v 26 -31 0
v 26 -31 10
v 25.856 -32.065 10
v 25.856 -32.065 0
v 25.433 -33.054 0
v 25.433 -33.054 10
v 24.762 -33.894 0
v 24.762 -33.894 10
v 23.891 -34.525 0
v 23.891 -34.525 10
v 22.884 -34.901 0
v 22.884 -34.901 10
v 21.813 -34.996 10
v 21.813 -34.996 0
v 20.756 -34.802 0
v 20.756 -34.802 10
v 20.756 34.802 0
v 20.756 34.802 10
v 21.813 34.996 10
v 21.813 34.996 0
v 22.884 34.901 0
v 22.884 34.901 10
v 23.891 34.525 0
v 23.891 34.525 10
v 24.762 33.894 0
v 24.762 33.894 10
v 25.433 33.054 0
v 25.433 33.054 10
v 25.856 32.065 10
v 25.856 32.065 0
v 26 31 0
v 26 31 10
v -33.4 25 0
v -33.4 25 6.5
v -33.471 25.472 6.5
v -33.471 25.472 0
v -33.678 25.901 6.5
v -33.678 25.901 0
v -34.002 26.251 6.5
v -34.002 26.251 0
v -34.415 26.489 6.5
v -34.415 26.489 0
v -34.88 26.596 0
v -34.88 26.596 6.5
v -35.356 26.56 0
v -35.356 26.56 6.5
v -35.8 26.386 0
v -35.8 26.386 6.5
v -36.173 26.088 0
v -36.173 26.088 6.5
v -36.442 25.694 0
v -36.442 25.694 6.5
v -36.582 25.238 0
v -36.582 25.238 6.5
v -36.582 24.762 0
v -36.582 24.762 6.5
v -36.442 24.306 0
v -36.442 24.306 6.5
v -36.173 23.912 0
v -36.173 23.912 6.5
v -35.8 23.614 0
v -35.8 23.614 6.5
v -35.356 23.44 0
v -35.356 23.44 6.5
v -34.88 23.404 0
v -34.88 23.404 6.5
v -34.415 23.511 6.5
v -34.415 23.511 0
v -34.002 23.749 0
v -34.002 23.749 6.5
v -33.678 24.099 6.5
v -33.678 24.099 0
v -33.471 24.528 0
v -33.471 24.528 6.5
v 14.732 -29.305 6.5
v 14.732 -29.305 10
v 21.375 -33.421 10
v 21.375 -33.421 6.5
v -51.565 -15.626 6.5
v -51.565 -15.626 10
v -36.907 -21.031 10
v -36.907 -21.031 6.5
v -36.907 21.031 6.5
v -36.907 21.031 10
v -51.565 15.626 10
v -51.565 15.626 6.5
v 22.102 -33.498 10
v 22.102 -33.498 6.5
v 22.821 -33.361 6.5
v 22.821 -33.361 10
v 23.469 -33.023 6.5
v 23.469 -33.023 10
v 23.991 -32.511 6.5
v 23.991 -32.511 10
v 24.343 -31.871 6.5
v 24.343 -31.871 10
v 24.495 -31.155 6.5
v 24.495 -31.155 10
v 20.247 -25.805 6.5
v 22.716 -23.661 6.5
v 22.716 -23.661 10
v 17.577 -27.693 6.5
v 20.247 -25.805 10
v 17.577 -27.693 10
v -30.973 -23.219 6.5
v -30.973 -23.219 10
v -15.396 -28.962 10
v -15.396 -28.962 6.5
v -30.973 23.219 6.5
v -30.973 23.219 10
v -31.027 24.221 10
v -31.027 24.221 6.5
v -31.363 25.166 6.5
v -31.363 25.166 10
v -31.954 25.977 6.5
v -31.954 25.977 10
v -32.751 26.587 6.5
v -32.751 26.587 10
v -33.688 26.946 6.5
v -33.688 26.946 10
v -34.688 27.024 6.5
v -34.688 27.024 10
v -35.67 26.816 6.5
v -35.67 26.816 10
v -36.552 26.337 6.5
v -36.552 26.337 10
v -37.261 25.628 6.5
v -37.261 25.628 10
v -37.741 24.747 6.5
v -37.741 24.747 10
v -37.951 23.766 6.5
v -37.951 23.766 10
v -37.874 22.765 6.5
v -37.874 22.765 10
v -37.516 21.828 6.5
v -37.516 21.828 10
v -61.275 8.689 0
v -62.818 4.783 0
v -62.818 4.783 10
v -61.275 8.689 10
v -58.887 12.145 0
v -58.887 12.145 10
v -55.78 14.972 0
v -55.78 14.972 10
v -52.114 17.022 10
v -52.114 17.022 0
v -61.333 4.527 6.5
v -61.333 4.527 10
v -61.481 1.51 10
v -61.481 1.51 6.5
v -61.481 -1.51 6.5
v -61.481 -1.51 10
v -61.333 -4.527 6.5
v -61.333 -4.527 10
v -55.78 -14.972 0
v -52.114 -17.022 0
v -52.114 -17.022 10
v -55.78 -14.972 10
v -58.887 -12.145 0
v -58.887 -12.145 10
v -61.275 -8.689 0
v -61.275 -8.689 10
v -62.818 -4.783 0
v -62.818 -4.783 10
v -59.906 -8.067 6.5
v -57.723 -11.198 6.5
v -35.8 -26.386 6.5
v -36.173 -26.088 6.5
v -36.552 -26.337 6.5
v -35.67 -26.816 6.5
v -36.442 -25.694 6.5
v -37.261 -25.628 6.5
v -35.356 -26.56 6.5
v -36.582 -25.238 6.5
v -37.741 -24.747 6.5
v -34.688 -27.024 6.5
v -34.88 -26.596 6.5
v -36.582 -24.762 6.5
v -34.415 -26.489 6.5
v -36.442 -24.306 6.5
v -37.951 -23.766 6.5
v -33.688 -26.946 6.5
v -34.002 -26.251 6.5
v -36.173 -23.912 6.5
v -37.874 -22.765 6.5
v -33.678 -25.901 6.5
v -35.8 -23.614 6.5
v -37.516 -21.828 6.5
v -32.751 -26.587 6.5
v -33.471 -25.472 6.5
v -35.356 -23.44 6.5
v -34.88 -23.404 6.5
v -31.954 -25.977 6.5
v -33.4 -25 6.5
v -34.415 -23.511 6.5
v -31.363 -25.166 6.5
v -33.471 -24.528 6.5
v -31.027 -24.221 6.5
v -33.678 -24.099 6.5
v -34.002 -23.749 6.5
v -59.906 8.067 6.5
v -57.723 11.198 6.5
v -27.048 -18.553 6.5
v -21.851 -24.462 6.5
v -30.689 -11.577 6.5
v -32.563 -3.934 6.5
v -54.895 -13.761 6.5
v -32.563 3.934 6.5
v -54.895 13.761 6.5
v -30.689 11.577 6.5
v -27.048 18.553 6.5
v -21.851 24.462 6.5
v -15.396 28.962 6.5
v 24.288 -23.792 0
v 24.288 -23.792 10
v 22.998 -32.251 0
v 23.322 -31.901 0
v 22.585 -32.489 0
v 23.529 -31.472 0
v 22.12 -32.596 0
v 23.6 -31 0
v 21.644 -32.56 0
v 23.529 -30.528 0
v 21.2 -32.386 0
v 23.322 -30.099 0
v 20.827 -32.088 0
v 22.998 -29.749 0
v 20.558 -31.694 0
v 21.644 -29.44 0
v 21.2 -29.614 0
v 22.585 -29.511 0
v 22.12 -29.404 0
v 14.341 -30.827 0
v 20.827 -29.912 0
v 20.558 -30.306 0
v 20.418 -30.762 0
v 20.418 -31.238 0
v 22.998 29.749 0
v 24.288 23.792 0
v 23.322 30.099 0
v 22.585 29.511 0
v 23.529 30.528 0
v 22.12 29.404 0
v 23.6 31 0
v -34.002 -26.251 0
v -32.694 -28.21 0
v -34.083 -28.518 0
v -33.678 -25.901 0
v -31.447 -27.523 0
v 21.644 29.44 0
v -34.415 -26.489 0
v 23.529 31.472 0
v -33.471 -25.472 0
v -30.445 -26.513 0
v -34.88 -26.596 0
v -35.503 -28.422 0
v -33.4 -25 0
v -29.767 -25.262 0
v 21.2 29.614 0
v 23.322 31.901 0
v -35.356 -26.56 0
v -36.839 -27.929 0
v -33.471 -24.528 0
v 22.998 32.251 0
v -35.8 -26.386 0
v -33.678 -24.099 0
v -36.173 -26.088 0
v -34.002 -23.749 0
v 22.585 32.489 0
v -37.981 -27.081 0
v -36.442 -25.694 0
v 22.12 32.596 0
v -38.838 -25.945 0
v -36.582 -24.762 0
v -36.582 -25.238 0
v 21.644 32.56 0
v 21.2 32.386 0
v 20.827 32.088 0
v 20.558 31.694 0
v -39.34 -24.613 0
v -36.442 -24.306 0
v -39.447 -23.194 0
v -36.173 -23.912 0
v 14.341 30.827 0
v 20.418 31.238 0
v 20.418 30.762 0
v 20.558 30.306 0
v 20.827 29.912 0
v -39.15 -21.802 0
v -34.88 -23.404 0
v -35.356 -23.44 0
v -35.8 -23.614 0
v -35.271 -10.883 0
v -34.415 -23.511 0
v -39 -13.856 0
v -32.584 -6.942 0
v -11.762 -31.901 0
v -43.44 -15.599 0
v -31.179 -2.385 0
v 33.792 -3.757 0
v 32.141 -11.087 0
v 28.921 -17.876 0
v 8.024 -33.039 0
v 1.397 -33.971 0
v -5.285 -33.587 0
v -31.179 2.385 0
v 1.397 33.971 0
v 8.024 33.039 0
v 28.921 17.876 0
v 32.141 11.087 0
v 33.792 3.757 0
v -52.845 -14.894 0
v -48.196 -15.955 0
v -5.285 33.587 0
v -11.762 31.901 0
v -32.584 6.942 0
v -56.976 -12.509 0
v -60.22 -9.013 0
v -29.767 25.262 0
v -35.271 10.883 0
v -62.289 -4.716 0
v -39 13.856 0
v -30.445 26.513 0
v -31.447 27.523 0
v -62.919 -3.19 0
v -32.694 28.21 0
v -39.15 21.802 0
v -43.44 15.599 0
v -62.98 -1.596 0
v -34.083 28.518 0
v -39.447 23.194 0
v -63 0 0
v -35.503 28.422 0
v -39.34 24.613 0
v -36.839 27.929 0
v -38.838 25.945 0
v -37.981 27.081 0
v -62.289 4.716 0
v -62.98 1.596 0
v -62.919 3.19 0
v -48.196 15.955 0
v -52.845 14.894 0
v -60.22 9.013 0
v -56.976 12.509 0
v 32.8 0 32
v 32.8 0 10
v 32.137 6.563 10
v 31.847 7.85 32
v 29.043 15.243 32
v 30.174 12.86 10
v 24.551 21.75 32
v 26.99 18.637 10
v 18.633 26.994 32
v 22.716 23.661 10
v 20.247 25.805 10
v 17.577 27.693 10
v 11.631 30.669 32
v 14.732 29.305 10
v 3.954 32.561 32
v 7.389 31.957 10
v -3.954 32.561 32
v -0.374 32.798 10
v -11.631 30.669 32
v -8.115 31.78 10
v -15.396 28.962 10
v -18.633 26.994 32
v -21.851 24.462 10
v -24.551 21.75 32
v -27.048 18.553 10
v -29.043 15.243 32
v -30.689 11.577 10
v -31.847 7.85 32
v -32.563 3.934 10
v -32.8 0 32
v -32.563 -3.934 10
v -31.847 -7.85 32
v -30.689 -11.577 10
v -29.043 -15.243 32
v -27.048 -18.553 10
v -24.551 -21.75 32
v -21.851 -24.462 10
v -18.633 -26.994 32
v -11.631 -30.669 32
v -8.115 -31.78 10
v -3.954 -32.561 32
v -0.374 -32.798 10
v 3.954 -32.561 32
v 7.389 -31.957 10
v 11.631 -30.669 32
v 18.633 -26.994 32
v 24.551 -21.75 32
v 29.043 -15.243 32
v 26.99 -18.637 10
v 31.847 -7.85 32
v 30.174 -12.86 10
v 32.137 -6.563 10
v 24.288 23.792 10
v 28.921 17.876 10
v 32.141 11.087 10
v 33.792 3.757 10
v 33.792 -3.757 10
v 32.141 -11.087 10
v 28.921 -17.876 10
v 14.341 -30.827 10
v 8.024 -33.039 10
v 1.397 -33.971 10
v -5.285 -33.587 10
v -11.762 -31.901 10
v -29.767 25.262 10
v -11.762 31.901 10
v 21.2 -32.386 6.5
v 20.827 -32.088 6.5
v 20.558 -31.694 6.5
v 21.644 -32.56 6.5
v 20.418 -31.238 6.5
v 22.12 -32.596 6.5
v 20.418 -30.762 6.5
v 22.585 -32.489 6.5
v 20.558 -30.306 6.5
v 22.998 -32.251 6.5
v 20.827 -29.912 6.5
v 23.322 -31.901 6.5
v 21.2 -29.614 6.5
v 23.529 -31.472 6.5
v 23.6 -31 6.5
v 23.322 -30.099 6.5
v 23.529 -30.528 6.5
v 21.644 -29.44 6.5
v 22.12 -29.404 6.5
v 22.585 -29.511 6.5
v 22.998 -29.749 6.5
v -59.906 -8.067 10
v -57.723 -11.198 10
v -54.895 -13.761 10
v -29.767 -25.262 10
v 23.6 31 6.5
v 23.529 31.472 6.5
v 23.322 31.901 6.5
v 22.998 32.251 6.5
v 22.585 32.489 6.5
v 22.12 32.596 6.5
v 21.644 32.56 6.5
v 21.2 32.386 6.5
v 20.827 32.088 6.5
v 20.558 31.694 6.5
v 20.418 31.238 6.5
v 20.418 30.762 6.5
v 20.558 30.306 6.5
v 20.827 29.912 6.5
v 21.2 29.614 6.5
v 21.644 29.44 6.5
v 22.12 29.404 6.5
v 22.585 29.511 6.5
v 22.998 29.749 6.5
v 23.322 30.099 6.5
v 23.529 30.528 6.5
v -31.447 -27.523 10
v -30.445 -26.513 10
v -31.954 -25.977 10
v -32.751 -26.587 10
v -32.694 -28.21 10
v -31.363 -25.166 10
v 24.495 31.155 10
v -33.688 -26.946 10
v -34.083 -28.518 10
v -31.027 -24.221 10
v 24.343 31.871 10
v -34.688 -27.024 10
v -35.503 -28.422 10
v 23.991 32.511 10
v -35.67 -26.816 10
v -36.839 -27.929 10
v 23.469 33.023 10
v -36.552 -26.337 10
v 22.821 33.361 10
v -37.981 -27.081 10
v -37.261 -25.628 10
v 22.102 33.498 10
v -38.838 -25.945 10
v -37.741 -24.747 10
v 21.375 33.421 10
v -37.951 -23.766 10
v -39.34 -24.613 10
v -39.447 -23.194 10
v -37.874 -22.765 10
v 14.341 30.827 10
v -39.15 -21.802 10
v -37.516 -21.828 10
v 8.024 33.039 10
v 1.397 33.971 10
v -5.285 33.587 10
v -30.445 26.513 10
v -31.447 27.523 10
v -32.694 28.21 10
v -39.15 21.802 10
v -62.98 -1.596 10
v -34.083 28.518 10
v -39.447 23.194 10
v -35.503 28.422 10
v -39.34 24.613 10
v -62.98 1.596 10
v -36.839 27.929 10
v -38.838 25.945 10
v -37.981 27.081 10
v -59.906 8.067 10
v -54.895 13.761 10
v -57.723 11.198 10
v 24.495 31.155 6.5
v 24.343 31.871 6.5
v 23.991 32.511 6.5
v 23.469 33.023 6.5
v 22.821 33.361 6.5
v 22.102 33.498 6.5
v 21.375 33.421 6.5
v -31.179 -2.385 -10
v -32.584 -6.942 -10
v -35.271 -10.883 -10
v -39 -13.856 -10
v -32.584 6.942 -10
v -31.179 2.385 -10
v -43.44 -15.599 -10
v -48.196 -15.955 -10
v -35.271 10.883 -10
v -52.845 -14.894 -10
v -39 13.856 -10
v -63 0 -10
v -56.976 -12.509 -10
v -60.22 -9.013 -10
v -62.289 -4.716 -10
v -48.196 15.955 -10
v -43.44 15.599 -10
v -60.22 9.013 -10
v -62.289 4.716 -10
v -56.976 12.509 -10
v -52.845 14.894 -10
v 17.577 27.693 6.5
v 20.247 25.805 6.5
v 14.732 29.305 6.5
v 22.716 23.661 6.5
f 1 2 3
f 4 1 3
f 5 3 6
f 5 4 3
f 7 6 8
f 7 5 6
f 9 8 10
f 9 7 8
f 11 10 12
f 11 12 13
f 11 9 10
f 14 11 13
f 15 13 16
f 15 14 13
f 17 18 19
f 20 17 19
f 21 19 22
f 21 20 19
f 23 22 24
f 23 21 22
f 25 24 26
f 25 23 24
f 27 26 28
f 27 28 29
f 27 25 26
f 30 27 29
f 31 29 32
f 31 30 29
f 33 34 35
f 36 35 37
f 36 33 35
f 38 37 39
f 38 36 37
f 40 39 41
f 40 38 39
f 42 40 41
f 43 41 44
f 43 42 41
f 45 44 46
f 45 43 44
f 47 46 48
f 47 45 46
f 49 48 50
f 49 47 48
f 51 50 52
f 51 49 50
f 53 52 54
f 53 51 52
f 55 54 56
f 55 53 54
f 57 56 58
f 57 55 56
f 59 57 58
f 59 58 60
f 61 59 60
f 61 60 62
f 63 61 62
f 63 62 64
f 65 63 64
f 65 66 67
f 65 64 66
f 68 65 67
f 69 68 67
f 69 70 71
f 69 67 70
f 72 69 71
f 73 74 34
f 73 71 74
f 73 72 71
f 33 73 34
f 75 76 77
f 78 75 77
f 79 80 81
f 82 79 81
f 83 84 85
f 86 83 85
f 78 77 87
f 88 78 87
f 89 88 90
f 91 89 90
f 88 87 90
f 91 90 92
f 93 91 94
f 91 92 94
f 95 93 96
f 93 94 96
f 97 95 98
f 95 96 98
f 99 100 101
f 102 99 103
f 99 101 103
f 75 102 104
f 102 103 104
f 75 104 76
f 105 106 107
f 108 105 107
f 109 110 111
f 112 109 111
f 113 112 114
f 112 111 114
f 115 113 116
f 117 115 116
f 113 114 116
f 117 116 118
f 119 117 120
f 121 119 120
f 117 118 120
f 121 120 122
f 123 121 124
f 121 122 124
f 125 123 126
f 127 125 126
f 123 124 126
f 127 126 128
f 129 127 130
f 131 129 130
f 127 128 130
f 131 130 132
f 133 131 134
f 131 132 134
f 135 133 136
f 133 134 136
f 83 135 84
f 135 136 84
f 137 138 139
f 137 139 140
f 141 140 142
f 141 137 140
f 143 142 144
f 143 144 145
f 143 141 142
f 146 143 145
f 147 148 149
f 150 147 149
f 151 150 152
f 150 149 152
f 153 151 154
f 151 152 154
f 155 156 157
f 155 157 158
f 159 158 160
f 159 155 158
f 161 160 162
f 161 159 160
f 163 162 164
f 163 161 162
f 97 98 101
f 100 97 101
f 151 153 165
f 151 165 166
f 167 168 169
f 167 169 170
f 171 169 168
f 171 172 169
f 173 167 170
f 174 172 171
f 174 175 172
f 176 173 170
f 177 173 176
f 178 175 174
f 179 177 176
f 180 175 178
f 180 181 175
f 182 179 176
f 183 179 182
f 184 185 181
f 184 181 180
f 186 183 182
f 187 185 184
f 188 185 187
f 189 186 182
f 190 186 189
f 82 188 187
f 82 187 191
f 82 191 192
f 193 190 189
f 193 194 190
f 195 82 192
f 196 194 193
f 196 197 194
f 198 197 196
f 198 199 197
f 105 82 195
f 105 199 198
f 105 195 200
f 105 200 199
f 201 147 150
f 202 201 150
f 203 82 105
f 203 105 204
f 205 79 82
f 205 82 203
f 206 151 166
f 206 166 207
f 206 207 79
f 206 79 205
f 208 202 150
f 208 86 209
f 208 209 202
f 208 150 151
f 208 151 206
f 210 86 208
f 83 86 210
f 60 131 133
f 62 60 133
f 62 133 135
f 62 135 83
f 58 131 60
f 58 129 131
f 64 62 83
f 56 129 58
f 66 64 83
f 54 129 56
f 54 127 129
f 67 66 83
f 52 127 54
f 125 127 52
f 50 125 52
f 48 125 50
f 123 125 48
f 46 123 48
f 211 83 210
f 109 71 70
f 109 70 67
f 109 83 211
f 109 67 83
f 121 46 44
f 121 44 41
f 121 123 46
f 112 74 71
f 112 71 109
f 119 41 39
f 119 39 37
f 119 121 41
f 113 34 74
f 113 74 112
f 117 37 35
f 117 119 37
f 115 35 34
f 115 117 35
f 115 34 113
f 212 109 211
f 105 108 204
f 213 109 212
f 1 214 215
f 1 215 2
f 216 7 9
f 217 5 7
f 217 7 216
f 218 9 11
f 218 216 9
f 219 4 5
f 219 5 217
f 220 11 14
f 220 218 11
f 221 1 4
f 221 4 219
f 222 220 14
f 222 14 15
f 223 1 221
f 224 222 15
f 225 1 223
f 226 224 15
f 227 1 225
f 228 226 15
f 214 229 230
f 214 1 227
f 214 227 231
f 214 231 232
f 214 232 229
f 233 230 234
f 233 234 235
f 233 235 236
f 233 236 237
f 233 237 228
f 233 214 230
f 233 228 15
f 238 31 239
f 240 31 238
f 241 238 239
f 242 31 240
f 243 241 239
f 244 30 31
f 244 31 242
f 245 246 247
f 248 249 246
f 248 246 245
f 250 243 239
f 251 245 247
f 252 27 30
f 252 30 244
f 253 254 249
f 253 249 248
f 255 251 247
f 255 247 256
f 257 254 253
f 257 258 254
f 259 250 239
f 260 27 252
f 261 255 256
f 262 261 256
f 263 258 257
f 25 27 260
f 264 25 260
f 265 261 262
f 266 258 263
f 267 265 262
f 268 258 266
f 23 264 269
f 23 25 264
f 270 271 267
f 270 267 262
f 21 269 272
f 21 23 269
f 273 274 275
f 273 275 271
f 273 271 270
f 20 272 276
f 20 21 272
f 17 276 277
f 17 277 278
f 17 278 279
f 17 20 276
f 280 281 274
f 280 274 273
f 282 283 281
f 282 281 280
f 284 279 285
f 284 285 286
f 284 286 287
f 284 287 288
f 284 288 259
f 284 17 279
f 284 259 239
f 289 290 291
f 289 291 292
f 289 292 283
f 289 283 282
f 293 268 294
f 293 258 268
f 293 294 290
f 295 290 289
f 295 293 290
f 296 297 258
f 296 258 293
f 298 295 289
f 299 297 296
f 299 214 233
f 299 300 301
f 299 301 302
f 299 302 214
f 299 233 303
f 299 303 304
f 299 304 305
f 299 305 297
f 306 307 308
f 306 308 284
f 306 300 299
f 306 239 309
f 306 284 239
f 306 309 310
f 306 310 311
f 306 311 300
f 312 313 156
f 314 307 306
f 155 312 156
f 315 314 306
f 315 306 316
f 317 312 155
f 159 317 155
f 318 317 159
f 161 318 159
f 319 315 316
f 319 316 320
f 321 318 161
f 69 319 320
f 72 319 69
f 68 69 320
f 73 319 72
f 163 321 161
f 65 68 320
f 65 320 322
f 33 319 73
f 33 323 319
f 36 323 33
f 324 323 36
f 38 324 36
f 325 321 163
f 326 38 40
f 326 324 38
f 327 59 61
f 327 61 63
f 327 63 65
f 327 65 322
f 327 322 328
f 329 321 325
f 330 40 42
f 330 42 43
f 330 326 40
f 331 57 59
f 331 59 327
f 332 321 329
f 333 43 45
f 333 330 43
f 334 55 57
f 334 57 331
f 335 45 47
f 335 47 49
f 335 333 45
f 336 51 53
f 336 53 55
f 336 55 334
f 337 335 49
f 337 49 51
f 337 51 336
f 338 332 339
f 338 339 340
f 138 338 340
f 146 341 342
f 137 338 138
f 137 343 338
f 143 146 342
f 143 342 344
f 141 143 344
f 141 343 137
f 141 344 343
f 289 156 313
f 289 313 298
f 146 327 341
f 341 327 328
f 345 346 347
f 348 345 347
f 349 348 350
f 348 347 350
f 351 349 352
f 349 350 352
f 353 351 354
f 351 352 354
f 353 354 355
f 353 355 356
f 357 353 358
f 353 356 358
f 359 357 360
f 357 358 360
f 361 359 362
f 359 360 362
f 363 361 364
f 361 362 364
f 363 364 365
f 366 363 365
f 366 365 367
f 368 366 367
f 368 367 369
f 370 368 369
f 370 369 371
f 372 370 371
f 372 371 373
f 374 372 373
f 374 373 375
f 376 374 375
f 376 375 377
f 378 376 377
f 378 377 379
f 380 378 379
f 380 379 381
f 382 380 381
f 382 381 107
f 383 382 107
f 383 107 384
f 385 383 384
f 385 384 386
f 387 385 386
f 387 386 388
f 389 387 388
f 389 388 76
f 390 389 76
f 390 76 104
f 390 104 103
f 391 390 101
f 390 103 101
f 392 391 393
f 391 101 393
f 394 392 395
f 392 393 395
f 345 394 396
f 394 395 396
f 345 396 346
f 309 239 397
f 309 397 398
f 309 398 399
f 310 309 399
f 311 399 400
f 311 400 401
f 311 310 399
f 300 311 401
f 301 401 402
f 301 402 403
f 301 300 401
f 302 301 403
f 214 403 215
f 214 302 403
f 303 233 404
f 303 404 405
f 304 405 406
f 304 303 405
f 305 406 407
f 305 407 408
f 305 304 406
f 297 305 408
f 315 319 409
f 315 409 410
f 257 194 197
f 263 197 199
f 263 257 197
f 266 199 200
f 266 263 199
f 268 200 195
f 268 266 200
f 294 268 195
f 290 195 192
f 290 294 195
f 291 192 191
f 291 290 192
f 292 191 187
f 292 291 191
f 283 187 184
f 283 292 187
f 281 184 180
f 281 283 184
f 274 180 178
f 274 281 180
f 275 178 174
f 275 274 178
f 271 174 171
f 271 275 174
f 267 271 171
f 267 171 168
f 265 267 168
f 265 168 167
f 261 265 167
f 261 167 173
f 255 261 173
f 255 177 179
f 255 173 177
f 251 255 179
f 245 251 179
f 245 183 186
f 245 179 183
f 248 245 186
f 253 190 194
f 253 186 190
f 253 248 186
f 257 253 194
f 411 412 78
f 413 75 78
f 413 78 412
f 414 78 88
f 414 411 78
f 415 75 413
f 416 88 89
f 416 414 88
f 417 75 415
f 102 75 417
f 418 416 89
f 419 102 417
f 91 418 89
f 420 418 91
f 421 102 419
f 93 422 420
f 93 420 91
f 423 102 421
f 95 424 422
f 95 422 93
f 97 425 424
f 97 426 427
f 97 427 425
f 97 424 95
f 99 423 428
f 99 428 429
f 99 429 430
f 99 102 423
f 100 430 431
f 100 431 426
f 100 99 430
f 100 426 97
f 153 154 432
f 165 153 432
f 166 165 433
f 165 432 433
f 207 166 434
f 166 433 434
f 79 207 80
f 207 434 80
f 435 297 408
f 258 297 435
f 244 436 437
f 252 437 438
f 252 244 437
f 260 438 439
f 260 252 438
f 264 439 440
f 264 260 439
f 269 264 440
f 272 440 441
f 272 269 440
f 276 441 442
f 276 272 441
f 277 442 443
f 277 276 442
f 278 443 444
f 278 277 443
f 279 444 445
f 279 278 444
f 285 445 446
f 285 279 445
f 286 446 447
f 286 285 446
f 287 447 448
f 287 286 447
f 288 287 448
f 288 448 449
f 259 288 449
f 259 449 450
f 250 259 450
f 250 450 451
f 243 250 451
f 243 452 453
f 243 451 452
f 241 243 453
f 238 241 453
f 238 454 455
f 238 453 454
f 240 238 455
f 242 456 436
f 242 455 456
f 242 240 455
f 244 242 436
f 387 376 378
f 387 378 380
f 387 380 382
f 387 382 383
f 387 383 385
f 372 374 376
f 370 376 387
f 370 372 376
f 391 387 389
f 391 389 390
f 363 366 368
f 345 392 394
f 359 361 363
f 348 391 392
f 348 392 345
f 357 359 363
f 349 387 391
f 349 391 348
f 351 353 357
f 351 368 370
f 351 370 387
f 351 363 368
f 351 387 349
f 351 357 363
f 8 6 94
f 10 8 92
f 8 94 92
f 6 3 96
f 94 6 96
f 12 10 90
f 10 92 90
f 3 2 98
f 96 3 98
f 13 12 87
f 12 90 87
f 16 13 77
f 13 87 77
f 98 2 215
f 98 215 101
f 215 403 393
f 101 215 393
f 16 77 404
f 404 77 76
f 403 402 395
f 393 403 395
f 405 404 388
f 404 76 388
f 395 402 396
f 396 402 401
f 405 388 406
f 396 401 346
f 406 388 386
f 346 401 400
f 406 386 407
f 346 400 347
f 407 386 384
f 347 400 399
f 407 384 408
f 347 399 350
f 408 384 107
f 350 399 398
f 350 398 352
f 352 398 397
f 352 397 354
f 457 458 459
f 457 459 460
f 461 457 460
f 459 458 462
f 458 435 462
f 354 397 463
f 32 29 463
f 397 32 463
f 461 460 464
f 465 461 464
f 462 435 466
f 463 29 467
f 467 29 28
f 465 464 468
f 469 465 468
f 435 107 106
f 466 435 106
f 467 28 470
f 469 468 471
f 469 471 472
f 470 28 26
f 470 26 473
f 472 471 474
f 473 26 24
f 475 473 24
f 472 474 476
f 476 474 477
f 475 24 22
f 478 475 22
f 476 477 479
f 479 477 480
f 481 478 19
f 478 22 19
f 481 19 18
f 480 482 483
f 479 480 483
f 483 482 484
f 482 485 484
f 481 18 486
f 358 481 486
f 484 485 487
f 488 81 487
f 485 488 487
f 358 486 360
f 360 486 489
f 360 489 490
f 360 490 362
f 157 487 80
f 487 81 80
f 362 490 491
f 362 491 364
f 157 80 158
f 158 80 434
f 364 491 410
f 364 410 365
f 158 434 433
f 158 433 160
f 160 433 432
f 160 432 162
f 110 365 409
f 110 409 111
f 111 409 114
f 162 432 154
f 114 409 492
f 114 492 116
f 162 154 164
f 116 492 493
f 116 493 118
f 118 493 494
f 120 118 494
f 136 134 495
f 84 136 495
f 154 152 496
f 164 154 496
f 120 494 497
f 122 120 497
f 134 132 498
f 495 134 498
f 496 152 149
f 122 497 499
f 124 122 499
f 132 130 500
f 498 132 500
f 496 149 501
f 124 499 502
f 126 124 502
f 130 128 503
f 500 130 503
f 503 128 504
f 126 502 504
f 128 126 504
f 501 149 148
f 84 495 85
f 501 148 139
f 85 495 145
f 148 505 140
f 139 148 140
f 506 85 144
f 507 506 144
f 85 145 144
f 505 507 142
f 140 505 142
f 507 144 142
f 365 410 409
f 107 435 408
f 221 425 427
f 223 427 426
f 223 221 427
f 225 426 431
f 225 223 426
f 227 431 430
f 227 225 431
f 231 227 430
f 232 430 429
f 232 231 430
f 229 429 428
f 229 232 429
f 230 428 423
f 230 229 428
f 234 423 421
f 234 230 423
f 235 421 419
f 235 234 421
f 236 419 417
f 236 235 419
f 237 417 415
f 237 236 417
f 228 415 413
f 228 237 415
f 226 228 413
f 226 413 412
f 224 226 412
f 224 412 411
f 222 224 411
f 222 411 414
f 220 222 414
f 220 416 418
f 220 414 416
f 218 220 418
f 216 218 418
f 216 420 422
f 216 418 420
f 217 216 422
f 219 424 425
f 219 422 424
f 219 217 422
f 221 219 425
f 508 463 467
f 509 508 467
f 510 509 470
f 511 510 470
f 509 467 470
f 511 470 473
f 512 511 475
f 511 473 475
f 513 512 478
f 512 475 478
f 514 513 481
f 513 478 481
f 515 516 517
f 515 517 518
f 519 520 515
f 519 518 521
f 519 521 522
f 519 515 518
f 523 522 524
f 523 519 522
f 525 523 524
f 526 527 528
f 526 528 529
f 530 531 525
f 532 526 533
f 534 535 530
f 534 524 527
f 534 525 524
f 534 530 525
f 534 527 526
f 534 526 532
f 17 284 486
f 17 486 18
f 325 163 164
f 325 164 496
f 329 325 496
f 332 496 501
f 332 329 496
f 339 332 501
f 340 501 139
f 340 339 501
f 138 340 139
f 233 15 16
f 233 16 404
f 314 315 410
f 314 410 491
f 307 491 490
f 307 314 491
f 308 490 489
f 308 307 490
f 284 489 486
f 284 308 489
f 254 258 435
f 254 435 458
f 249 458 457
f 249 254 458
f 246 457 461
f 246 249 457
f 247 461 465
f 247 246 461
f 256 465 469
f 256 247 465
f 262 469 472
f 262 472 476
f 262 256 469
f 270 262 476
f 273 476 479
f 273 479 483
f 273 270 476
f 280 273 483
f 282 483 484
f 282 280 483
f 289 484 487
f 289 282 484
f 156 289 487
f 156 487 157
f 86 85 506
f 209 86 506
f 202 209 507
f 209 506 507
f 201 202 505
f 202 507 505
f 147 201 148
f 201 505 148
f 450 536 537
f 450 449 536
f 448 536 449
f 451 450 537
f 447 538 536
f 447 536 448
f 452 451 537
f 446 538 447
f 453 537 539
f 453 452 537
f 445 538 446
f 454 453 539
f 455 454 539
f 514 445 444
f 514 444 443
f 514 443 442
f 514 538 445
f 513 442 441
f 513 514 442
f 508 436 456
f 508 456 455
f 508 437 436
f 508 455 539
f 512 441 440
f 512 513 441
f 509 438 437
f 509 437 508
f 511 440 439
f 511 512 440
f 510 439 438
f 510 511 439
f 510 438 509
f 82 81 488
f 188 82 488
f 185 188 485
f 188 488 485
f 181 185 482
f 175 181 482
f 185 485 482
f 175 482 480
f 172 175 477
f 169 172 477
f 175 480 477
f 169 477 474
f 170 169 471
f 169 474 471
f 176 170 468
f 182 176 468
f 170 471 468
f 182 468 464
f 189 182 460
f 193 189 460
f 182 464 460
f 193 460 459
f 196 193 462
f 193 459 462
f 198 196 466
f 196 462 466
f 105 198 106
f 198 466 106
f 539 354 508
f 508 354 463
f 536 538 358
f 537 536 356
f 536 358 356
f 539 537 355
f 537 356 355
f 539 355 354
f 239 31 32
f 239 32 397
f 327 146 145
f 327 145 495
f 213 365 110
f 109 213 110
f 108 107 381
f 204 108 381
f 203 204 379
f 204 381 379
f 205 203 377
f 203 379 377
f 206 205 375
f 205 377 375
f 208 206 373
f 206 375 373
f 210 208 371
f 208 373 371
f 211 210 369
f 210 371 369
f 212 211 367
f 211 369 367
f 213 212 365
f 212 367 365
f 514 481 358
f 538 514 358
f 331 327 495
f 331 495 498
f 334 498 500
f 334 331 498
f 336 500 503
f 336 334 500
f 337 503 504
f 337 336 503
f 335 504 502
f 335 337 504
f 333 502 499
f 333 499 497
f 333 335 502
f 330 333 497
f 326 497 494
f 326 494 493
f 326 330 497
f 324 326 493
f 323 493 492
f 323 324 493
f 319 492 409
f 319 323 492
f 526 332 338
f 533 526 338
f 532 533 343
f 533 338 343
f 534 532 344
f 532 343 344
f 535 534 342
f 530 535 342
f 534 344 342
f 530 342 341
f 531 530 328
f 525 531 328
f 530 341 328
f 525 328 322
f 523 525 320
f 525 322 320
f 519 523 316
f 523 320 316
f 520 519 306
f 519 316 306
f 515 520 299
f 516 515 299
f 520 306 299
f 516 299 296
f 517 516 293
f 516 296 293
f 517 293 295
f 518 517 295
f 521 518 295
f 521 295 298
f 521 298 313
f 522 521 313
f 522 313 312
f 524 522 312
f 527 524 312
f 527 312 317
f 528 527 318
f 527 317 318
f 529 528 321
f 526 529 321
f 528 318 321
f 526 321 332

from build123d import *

# Parameters (mm, degrees)
ESQUISSE1_R             = 1.6
BOSS_EXTRU_1_DEPTH      = 10
ESQUISSE2_R             = 32.8
BOSS_EXTRU_2_DEPTH      = 22
ENL_V_MAT_EXTRU_1_DEPTH = 3.5
BOSS_EXTRU_3_REACH      = 12
ESQUISSE5_R             = 16
BOSS_EXTRU_4_DEPTH      = 10


with BuildPart() as part:
    # Esquisse1 → Boss.-Extru.1 (new body)
    with BuildSketch(Plane.XY):
        with BuildLine():
            ThreePointArc((-52.114163482, -17.022112424), (-58.887228209, -12.14530881), (-62.818181851, -4.782889184))
            ThreePointArc((-62.818181851, -4.782889184), (-63, 0), (-62.818181851, 4.782889184))
            ThreePointArc((-62.818181851, 4.782889184), (-58.887228209, 12.14530881), (-52.114163482, 17.022112424))
            Line((-52.114163482, 17.022112424), (-39.149984877, 21.802247897))
            ThreePointArc((-39.149984877, 21.802247897), (-36.188478781, 28.223266636), (-29.767460042, 25.26176054))
            Line((-29.767460042, 25.26176054), (-11.762342986, 31.900584438))
            ThreePointArc((-11.762342986, 31.900584438), (1.39665257, 33.97130203), (14.341260705, 30.827394333))
            Line((14.341260705, 30.827394333), (20.756023105, 34.801647207))
            ThreePointArc((20.756023105, 34.801647207), (24.347774736, 34.238511045), (26, 31))
            Line((26, 31), (24.288429708, 23.792271483))
            ThreePointArc((24.288429708, 23.792271483), (34, 0), (24.288429708, -23.792271483))
            Line((24.288429708, -23.792271483), (26, -31))
            ThreePointArc((26, -31), (24.347774736, -34.238511045), (20.756023105, -34.801647207))
            Line((20.756023105, -34.801647207), (14.341260705, -30.827394333))
            ThreePointArc((14.341260705, -30.827394333), (1.39665257, -33.97130203), (-11.762342986, -31.900584438))
            Line((-11.762342986, -31.900584438), (-29.767460042, -25.26176054))
            ThreePointArc((-29.767460042, -25.26176054), (-36.188478781, -28.223266636), (-39.149984877, -21.802247897))
            Line((-39.149984877, -21.802247897), (-52.114163482, -17.022112424))
        make_face()
        with Locations((-35, -25)):
            Circle(ESQUISSE1_R, mode=Mode.SUBTRACT)
        with Locations((22, 31)):
            Circle(ESQUISSE1_R, mode=Mode.SUBTRACT)
        with Locations((-35, 25)):
            Circle(ESQUISSE1_R, mode=Mode.SUBTRACT)
        with Locations((22, -31)):
            Circle(ESQUISSE1_R, mode=Mode.SUBTRACT)
    extrude(amount=BOSS_EXTRU_1_DEPTH)

    # Esquisse2 → Boss.-Extru.2 (add)
    with BuildSketch(Plane.XY.offset(10)):
        Circle(ESQUISSE2_R)
    extrude(amount=BOSS_EXTRU_2_DEPTH)

    # Esquisse3 → Enlèv. mat.-Extru.1 (cut)
    with BuildSketch(Plane.XY.offset(10)):
        with BuildLine():
            Line((-51.564604514, -15.626028317), (-36.906810431, -21.030631539))
            ThreePointArc((-36.906810431, -21.030631539), (-35.669551885, -26.815887911), (-30.972780695, -23.218619448))
            Line((-30.972780695, -23.218619448), (-11.24341609, -30.493205713))
            ThreePointArc((-11.24341609, -30.493205713), (1.736287169, -32.453586965), (14.43273391, -29.119515653))
            Line((14.43273391, -29.119515653), (21.375089208, -33.420637623))
            ThreePointArc((21.375089208, -33.420637623), (23.468804453, -33.02302088), (24.495170617, -31.155317718))
            Line((24.495170617, -31.155317718), (22.63500045, -23.321808563))
            ThreePointArc((22.63500045, -23.321808563), (32.5, 0), (22.63500045, 23.321808563))
            Line((22.63500045, 23.321808563), (24.495170617, 31.155317718))
            ThreePointArc((24.495170617, 31.155317718), (23.468804453, 33.02302088), (21.375089208, 33.420637623))
            Line((21.375089208, 33.420637623), (14.43273391, 29.119515653))
            ThreePointArc((14.43273391, 29.119515653), (1.736287169, 32.453586965), (-11.24341609, 30.493205713))
            Line((-11.24341609, 30.493205713), (-30.972780695, 23.218619448))
            ThreePointArc((-30.972780695, 23.218619448), (-35.669551885, 26.815887911), (-36.906810431, 21.030631539))
            Line((-36.906810431, 21.030631539), (-51.564604514, 15.626028317))
            ThreePointArc((-51.564604514, 15.626028317), (-57.722932582, 11.197936413), (-61.33314674, 4.527152633))
            ThreePointArc((-61.33314674, 4.527152633), (-61.5, 0), (-61.33314674, -4.527152633))
            ThreePointArc((-61.33314674, -4.527152633), (-57.722932582, -11.197936413), (-51.564604514, -15.626028317))
        make_face()
    extrude(amount=-ENL_V_MAT_EXTRU_1_DEPTH, mode=Mode.SUBTRACT)

    # Esquisse4 → Boss.-Extru.3 (add, up to next)
    with BuildSketch(Plane(origin=(0, 0, 10), x_dir=(-1, 0, 0), z_dir=(0, 0, -1)), mode=Mode.PRIVATE) as boss_extru_3_sk1:
        with BuildLine():
            Line((-22.715550233, 23.661018101), (-22.63500045, 23.321808563))
            ThreePointArc((-22.63500045, 23.321808563), (-32.5, 0), (-22.63500045, -23.321808563))
            Line((-22.63500045, -23.321808563), (-22.715550233, -23.661018101))
            ThreePointArc((-22.715550233, -23.661018101), (-18.935479047, -26.78222607), (-14.732448894, -29.305203456))
            Line((-14.732448894, -29.305203456), (-14.43273391, -29.119515653))
            ThreePointArc((-14.43273391, -29.119515653), (-1.736287169, -32.453586965), (11.24341609, -30.493205713))
            Line((11.24341609, -30.493205713), (15.396177122, -28.962004938))
            ThreePointArc((15.396177122, -28.962004938), (32.8, 0), (15.396177122, 28.962004938))
            Line((15.396177122, 28.962004938), (11.24341609, 30.493205713))
            ThreePointArc((11.24341609, 30.493205713), (-1.736287169, 32.453586965), (-14.43273391, 29.119515653))
            Line((-14.43273391, 29.119515653), (-14.732448894, 29.305203456))
            ThreePointArc((-14.732448894, 29.305203456), (-18.935479047, 26.78222607), (-22.715550233, 23.661018101))
        make_face()
    boss_extru_3_tool1 = extrude(boss_extru_3_sk1.sketch, amount=BOSS_EXTRU_3_REACH, mode=Mode.PRIVATE) - part.part
    add(boss_extru_3_tool1.solids().sort_by_distance((-0.139045, 0, 10))[0])

    # Esquisse5 → Boss.-Extru.4 (add)
    with BuildSketch(Plane(origin=(0, 0, 0), x_dir=(-1, 0, 0), z_dir=(0, 0, -1))):
        with Locations((47, 0)):
            Circle(ESQUISSE5_R)
    extrude(amount=BOSS_EXTRU_4_DEPTH)


solid = part.part
